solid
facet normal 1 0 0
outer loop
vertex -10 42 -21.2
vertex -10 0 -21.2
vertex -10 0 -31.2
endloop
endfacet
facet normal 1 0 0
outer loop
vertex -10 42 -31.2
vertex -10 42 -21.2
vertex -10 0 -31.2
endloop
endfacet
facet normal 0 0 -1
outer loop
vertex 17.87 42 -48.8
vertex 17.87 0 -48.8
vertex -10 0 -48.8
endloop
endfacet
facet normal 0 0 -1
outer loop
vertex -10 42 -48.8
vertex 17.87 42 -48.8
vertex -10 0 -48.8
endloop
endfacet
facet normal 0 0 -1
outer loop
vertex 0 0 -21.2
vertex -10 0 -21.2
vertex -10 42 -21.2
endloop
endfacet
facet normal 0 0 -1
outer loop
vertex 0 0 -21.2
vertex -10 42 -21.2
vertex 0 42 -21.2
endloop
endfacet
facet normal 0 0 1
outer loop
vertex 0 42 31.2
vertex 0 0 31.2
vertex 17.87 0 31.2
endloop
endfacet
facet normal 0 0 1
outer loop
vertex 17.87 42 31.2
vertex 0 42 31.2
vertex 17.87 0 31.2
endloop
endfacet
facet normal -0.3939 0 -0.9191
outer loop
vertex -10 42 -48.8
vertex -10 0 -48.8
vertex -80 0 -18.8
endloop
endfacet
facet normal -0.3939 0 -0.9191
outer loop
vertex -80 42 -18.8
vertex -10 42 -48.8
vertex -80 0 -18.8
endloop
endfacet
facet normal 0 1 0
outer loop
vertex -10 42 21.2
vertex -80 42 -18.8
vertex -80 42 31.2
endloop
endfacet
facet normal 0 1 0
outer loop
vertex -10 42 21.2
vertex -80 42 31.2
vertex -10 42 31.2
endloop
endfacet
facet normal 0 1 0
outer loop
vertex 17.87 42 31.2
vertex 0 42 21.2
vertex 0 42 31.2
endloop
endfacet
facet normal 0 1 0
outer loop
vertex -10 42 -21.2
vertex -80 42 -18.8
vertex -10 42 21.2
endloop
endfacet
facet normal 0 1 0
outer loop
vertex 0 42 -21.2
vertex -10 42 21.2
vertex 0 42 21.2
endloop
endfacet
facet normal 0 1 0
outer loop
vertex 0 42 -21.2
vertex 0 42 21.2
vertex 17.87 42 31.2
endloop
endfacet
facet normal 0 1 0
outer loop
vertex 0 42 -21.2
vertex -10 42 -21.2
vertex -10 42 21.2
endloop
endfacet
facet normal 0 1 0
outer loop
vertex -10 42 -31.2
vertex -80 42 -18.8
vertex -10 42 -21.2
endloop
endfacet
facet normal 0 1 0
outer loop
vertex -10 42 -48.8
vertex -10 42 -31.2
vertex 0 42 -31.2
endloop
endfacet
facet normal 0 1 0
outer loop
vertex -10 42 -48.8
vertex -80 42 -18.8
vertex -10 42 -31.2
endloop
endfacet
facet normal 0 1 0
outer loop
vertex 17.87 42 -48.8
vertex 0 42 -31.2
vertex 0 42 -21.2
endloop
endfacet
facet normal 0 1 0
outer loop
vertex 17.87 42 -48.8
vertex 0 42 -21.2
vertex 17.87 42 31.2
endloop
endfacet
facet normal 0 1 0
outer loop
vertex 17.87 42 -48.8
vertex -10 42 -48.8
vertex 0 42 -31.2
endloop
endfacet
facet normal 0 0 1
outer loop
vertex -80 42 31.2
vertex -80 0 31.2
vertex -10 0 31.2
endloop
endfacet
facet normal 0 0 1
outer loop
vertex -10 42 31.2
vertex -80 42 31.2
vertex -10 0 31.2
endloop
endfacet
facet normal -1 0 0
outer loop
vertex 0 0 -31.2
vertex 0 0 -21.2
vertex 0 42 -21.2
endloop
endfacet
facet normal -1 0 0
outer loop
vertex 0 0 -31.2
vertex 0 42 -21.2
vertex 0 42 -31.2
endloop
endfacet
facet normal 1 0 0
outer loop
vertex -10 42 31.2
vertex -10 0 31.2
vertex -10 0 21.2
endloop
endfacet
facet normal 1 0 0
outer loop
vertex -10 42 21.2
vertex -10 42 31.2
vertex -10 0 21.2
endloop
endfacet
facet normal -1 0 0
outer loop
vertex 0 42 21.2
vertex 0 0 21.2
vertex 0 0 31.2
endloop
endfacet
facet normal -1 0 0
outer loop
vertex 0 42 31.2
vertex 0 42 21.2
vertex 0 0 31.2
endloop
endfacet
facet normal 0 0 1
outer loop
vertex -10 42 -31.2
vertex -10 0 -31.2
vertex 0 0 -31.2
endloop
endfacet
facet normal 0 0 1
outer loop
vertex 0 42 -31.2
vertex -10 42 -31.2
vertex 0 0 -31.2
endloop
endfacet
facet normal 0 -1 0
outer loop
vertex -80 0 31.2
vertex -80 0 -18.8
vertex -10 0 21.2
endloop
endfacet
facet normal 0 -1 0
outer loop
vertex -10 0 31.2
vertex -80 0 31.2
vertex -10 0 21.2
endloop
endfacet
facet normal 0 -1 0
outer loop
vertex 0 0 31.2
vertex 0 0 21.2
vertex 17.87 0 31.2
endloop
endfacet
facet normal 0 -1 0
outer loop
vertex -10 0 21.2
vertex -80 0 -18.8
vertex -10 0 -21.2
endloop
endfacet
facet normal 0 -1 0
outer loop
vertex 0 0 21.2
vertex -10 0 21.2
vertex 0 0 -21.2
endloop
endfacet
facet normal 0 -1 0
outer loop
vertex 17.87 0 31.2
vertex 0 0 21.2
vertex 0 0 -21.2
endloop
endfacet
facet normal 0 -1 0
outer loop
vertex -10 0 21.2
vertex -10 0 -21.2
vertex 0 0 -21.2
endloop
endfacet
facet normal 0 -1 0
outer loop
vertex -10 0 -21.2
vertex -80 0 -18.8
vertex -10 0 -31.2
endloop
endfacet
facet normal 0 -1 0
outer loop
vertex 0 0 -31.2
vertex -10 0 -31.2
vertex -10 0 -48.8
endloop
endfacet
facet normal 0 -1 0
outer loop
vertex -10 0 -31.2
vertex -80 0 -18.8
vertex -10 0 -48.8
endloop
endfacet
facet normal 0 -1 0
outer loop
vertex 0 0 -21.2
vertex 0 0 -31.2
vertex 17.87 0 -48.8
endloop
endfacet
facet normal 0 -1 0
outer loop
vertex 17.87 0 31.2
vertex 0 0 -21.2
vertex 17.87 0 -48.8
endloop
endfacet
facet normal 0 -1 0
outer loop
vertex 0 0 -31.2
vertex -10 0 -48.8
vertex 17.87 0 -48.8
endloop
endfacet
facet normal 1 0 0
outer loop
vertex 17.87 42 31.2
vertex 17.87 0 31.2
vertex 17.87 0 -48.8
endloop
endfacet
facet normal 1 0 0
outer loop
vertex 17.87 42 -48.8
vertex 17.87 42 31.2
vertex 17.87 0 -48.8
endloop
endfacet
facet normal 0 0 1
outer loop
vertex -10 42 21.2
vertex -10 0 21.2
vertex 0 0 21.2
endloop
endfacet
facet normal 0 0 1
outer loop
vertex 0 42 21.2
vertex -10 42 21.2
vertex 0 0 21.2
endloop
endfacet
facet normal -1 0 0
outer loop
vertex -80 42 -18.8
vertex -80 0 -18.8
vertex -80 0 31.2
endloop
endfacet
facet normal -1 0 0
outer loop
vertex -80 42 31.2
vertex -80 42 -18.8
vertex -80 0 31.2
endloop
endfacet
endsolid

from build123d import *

# Parameters (mm, degrees)
ESQUISSE1_W        = 10
ESQUISSE1_H        = 10
BOSS_EXTRU_1_DEPTH = 42


with BuildPart() as part:
    # Esquisse1 → Boss.-Extru.1 (new body)
    with BuildSketch(Plane(origin=(0, 0, 0), x_dir=(1, 0, 0), z_dir=(0, 1, 0))):
        Polygon((0, -21.2), (0, -31.2), (17.87, -31.2), (17.87, 48.8), (-10, 48.8), (-80, 18.8), (-80, -31.2), (-10, -31.2), (-10, -21.2), align=None)
        with Locations((-5, 26.2)):
            Rectangle(ESQUISSE1_W, ESQUISSE1_H, mode=Mode.SUBTRACT)
    extrude(amount=BOSS_EXTRU_1_DEPTH)


solid = part.part
